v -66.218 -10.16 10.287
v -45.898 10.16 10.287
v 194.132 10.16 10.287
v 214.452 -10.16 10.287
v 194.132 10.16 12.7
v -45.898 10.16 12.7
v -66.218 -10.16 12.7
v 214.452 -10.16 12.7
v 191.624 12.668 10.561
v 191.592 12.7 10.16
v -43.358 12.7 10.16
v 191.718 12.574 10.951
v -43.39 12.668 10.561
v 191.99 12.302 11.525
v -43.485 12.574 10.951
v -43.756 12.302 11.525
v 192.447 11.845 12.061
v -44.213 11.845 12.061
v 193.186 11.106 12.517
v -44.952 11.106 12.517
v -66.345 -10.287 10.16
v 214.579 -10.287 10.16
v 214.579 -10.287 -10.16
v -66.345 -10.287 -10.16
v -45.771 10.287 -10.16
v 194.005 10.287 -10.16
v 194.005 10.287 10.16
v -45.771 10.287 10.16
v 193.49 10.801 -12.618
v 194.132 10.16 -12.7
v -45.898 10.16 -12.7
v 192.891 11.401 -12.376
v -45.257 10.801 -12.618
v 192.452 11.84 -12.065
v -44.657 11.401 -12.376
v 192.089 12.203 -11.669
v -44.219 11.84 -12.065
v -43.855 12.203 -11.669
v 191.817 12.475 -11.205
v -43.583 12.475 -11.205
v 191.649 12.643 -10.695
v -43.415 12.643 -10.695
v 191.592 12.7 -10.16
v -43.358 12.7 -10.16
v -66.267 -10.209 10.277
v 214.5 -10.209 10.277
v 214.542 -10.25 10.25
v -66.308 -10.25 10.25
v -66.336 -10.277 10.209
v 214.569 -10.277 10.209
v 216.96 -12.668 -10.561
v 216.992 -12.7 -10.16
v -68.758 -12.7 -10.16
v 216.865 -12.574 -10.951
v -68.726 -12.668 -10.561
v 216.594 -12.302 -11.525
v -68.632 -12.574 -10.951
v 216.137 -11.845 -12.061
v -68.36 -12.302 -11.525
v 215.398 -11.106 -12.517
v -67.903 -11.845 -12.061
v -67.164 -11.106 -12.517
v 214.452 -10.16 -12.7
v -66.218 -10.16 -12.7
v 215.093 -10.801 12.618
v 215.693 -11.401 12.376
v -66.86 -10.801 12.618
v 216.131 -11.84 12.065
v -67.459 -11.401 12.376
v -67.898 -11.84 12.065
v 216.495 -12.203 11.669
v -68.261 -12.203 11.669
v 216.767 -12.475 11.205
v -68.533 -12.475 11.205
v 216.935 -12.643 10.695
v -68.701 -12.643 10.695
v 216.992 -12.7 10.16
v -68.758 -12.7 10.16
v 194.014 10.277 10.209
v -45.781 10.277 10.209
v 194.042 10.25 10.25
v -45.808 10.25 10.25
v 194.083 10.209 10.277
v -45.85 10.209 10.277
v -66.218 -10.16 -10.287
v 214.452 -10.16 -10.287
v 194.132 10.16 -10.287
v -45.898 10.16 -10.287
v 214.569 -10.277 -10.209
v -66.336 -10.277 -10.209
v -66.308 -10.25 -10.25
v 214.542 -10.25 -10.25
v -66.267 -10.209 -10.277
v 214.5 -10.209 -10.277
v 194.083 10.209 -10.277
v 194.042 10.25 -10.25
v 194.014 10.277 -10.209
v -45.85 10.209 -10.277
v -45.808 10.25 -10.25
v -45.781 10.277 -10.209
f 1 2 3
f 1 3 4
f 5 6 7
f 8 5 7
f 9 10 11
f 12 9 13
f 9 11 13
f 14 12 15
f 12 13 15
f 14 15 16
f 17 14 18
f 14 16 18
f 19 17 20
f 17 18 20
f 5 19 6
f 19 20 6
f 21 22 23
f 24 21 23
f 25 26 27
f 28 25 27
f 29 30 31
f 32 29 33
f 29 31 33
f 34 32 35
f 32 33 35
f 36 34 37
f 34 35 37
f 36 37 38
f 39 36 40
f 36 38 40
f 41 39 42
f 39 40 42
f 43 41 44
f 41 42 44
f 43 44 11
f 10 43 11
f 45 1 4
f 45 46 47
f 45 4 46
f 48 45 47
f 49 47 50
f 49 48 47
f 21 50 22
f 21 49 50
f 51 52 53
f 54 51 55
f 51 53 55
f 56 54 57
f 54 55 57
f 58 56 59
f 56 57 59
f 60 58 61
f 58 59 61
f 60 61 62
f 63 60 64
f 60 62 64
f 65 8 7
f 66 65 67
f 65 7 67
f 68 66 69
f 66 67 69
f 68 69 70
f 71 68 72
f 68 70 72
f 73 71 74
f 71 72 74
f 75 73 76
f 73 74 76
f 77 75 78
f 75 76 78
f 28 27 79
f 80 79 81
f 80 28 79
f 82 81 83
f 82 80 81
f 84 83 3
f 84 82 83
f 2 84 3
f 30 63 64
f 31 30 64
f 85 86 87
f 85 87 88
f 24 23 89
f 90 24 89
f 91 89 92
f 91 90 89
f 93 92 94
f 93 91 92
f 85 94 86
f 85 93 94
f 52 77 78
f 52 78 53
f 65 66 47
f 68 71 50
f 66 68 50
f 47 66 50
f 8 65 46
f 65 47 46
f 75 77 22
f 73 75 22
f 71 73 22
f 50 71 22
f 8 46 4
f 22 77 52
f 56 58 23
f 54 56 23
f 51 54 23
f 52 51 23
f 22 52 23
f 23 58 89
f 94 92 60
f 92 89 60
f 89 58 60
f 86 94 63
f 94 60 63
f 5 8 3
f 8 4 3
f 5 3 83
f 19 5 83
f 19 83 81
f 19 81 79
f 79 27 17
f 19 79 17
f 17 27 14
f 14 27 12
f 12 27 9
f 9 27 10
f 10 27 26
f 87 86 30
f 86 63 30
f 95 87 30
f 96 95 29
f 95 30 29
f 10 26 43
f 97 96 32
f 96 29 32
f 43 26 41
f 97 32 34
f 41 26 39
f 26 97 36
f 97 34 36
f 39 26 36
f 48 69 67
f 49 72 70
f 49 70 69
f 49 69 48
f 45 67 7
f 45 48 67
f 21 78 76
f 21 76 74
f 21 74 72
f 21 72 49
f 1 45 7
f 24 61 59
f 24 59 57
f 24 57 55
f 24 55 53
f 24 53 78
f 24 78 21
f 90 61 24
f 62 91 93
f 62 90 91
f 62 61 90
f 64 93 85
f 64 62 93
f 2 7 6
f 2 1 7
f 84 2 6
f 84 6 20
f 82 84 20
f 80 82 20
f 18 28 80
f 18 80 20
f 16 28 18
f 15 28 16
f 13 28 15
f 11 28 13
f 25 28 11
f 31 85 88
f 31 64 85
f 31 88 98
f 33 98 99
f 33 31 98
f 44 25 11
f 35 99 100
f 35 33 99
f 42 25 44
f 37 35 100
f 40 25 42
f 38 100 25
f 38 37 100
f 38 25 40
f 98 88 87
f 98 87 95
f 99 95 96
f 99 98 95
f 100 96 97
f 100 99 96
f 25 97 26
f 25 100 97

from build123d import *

# Parameters (mm, degrees)
SQUARE_TUBE_CONFIGURED_2_X_2_X_0_25_1_DEPTH = 285.75
CUT_EXTRUDE1_DEPTH                          = 218.733740656
CUT_EXTRUDE1_DEPTH_BACK                     = 218.733740656


with BuildPart() as part:
    # Sketch11 → Square tube - configured 2 X 2 X 0.25(1) (new body)
    with BuildSketch(Plane.YZ.offset(-68.758290896)):
        with BuildLine():
            Line((-10.16, -12.7), (10.16, -12.7))
            ThreePointArc((10.16, -12.7), (11.956051224, -11.956051224), (12.7, -10.16))
            Line((12.7, -10.16), (12.7, 10.16))
            ThreePointArc((12.7, 10.16), (11.956051224, 11.956051224), (10.16, 12.7))
            Line((10.16, 12.7), (-10.16, 12.7))
            ThreePointArc((-10.16, 12.7), (-11.956051224, 11.956051224), (-12.7, 10.16))
            Line((-12.7, 10.16), (-12.7, -10.16))
            ThreePointArc((-12.7, -10.16), (-11.956051224, -11.956051224), (-10.16, -12.7))
        make_face()
        with BuildLine():
            Line((-10.16, -10.287), (10.16, -10.287))
            ThreePointArc((10.16, -10.287), (10.249802561, -10.249802561), (10.287, -10.16))
            Line((10.287, -10.16), (10.287, 10.16))
            ThreePointArc((10.287, 10.16), (10.249802561, 10.249802561), (10.16, 10.287))
            Line((10.16, 10.287), (-10.16, 10.287))
            ThreePointArc((-10.16, 10.287), (-10.249802561, 10.249802561), (-10.287, 10.16))
            Line((-10.287, 10.16), (-10.287, -10.16))
            ThreePointArc((-10.287, -10.16), (-10.249802561, -10.249802561), (-10.16, -10.287))
        make_face(mode=Mode.SUBTRACT)
    extrude(amount=SQUARE_TUBE_CONFIGURED_2_X_2_X_0_25_1_DEPTH)

    # Sketch12 → Cut-Extrude1 (cut, two sides: drawn at the far end of the back side and taken through both)
    with BuildSketch(Plane.XY.offset(-CUT_EXTRUDE1_DEPTH_BACK)):
        Polygon((-68.758290896, -12.7), (-43.358290896, 12.7), (-68.758290896, 12.7), align=None)
        Polygon((216.991709104, -12.7), (191.591709104, 12.7), (216.991709104, 12.7), align=None)
    extrude(amount=CUT_EXTRUDE1_DEPTH + CUT_EXTRUDE1_DEPTH_BACK, mode=Mode.SUBTRACT)


solid = part.part
